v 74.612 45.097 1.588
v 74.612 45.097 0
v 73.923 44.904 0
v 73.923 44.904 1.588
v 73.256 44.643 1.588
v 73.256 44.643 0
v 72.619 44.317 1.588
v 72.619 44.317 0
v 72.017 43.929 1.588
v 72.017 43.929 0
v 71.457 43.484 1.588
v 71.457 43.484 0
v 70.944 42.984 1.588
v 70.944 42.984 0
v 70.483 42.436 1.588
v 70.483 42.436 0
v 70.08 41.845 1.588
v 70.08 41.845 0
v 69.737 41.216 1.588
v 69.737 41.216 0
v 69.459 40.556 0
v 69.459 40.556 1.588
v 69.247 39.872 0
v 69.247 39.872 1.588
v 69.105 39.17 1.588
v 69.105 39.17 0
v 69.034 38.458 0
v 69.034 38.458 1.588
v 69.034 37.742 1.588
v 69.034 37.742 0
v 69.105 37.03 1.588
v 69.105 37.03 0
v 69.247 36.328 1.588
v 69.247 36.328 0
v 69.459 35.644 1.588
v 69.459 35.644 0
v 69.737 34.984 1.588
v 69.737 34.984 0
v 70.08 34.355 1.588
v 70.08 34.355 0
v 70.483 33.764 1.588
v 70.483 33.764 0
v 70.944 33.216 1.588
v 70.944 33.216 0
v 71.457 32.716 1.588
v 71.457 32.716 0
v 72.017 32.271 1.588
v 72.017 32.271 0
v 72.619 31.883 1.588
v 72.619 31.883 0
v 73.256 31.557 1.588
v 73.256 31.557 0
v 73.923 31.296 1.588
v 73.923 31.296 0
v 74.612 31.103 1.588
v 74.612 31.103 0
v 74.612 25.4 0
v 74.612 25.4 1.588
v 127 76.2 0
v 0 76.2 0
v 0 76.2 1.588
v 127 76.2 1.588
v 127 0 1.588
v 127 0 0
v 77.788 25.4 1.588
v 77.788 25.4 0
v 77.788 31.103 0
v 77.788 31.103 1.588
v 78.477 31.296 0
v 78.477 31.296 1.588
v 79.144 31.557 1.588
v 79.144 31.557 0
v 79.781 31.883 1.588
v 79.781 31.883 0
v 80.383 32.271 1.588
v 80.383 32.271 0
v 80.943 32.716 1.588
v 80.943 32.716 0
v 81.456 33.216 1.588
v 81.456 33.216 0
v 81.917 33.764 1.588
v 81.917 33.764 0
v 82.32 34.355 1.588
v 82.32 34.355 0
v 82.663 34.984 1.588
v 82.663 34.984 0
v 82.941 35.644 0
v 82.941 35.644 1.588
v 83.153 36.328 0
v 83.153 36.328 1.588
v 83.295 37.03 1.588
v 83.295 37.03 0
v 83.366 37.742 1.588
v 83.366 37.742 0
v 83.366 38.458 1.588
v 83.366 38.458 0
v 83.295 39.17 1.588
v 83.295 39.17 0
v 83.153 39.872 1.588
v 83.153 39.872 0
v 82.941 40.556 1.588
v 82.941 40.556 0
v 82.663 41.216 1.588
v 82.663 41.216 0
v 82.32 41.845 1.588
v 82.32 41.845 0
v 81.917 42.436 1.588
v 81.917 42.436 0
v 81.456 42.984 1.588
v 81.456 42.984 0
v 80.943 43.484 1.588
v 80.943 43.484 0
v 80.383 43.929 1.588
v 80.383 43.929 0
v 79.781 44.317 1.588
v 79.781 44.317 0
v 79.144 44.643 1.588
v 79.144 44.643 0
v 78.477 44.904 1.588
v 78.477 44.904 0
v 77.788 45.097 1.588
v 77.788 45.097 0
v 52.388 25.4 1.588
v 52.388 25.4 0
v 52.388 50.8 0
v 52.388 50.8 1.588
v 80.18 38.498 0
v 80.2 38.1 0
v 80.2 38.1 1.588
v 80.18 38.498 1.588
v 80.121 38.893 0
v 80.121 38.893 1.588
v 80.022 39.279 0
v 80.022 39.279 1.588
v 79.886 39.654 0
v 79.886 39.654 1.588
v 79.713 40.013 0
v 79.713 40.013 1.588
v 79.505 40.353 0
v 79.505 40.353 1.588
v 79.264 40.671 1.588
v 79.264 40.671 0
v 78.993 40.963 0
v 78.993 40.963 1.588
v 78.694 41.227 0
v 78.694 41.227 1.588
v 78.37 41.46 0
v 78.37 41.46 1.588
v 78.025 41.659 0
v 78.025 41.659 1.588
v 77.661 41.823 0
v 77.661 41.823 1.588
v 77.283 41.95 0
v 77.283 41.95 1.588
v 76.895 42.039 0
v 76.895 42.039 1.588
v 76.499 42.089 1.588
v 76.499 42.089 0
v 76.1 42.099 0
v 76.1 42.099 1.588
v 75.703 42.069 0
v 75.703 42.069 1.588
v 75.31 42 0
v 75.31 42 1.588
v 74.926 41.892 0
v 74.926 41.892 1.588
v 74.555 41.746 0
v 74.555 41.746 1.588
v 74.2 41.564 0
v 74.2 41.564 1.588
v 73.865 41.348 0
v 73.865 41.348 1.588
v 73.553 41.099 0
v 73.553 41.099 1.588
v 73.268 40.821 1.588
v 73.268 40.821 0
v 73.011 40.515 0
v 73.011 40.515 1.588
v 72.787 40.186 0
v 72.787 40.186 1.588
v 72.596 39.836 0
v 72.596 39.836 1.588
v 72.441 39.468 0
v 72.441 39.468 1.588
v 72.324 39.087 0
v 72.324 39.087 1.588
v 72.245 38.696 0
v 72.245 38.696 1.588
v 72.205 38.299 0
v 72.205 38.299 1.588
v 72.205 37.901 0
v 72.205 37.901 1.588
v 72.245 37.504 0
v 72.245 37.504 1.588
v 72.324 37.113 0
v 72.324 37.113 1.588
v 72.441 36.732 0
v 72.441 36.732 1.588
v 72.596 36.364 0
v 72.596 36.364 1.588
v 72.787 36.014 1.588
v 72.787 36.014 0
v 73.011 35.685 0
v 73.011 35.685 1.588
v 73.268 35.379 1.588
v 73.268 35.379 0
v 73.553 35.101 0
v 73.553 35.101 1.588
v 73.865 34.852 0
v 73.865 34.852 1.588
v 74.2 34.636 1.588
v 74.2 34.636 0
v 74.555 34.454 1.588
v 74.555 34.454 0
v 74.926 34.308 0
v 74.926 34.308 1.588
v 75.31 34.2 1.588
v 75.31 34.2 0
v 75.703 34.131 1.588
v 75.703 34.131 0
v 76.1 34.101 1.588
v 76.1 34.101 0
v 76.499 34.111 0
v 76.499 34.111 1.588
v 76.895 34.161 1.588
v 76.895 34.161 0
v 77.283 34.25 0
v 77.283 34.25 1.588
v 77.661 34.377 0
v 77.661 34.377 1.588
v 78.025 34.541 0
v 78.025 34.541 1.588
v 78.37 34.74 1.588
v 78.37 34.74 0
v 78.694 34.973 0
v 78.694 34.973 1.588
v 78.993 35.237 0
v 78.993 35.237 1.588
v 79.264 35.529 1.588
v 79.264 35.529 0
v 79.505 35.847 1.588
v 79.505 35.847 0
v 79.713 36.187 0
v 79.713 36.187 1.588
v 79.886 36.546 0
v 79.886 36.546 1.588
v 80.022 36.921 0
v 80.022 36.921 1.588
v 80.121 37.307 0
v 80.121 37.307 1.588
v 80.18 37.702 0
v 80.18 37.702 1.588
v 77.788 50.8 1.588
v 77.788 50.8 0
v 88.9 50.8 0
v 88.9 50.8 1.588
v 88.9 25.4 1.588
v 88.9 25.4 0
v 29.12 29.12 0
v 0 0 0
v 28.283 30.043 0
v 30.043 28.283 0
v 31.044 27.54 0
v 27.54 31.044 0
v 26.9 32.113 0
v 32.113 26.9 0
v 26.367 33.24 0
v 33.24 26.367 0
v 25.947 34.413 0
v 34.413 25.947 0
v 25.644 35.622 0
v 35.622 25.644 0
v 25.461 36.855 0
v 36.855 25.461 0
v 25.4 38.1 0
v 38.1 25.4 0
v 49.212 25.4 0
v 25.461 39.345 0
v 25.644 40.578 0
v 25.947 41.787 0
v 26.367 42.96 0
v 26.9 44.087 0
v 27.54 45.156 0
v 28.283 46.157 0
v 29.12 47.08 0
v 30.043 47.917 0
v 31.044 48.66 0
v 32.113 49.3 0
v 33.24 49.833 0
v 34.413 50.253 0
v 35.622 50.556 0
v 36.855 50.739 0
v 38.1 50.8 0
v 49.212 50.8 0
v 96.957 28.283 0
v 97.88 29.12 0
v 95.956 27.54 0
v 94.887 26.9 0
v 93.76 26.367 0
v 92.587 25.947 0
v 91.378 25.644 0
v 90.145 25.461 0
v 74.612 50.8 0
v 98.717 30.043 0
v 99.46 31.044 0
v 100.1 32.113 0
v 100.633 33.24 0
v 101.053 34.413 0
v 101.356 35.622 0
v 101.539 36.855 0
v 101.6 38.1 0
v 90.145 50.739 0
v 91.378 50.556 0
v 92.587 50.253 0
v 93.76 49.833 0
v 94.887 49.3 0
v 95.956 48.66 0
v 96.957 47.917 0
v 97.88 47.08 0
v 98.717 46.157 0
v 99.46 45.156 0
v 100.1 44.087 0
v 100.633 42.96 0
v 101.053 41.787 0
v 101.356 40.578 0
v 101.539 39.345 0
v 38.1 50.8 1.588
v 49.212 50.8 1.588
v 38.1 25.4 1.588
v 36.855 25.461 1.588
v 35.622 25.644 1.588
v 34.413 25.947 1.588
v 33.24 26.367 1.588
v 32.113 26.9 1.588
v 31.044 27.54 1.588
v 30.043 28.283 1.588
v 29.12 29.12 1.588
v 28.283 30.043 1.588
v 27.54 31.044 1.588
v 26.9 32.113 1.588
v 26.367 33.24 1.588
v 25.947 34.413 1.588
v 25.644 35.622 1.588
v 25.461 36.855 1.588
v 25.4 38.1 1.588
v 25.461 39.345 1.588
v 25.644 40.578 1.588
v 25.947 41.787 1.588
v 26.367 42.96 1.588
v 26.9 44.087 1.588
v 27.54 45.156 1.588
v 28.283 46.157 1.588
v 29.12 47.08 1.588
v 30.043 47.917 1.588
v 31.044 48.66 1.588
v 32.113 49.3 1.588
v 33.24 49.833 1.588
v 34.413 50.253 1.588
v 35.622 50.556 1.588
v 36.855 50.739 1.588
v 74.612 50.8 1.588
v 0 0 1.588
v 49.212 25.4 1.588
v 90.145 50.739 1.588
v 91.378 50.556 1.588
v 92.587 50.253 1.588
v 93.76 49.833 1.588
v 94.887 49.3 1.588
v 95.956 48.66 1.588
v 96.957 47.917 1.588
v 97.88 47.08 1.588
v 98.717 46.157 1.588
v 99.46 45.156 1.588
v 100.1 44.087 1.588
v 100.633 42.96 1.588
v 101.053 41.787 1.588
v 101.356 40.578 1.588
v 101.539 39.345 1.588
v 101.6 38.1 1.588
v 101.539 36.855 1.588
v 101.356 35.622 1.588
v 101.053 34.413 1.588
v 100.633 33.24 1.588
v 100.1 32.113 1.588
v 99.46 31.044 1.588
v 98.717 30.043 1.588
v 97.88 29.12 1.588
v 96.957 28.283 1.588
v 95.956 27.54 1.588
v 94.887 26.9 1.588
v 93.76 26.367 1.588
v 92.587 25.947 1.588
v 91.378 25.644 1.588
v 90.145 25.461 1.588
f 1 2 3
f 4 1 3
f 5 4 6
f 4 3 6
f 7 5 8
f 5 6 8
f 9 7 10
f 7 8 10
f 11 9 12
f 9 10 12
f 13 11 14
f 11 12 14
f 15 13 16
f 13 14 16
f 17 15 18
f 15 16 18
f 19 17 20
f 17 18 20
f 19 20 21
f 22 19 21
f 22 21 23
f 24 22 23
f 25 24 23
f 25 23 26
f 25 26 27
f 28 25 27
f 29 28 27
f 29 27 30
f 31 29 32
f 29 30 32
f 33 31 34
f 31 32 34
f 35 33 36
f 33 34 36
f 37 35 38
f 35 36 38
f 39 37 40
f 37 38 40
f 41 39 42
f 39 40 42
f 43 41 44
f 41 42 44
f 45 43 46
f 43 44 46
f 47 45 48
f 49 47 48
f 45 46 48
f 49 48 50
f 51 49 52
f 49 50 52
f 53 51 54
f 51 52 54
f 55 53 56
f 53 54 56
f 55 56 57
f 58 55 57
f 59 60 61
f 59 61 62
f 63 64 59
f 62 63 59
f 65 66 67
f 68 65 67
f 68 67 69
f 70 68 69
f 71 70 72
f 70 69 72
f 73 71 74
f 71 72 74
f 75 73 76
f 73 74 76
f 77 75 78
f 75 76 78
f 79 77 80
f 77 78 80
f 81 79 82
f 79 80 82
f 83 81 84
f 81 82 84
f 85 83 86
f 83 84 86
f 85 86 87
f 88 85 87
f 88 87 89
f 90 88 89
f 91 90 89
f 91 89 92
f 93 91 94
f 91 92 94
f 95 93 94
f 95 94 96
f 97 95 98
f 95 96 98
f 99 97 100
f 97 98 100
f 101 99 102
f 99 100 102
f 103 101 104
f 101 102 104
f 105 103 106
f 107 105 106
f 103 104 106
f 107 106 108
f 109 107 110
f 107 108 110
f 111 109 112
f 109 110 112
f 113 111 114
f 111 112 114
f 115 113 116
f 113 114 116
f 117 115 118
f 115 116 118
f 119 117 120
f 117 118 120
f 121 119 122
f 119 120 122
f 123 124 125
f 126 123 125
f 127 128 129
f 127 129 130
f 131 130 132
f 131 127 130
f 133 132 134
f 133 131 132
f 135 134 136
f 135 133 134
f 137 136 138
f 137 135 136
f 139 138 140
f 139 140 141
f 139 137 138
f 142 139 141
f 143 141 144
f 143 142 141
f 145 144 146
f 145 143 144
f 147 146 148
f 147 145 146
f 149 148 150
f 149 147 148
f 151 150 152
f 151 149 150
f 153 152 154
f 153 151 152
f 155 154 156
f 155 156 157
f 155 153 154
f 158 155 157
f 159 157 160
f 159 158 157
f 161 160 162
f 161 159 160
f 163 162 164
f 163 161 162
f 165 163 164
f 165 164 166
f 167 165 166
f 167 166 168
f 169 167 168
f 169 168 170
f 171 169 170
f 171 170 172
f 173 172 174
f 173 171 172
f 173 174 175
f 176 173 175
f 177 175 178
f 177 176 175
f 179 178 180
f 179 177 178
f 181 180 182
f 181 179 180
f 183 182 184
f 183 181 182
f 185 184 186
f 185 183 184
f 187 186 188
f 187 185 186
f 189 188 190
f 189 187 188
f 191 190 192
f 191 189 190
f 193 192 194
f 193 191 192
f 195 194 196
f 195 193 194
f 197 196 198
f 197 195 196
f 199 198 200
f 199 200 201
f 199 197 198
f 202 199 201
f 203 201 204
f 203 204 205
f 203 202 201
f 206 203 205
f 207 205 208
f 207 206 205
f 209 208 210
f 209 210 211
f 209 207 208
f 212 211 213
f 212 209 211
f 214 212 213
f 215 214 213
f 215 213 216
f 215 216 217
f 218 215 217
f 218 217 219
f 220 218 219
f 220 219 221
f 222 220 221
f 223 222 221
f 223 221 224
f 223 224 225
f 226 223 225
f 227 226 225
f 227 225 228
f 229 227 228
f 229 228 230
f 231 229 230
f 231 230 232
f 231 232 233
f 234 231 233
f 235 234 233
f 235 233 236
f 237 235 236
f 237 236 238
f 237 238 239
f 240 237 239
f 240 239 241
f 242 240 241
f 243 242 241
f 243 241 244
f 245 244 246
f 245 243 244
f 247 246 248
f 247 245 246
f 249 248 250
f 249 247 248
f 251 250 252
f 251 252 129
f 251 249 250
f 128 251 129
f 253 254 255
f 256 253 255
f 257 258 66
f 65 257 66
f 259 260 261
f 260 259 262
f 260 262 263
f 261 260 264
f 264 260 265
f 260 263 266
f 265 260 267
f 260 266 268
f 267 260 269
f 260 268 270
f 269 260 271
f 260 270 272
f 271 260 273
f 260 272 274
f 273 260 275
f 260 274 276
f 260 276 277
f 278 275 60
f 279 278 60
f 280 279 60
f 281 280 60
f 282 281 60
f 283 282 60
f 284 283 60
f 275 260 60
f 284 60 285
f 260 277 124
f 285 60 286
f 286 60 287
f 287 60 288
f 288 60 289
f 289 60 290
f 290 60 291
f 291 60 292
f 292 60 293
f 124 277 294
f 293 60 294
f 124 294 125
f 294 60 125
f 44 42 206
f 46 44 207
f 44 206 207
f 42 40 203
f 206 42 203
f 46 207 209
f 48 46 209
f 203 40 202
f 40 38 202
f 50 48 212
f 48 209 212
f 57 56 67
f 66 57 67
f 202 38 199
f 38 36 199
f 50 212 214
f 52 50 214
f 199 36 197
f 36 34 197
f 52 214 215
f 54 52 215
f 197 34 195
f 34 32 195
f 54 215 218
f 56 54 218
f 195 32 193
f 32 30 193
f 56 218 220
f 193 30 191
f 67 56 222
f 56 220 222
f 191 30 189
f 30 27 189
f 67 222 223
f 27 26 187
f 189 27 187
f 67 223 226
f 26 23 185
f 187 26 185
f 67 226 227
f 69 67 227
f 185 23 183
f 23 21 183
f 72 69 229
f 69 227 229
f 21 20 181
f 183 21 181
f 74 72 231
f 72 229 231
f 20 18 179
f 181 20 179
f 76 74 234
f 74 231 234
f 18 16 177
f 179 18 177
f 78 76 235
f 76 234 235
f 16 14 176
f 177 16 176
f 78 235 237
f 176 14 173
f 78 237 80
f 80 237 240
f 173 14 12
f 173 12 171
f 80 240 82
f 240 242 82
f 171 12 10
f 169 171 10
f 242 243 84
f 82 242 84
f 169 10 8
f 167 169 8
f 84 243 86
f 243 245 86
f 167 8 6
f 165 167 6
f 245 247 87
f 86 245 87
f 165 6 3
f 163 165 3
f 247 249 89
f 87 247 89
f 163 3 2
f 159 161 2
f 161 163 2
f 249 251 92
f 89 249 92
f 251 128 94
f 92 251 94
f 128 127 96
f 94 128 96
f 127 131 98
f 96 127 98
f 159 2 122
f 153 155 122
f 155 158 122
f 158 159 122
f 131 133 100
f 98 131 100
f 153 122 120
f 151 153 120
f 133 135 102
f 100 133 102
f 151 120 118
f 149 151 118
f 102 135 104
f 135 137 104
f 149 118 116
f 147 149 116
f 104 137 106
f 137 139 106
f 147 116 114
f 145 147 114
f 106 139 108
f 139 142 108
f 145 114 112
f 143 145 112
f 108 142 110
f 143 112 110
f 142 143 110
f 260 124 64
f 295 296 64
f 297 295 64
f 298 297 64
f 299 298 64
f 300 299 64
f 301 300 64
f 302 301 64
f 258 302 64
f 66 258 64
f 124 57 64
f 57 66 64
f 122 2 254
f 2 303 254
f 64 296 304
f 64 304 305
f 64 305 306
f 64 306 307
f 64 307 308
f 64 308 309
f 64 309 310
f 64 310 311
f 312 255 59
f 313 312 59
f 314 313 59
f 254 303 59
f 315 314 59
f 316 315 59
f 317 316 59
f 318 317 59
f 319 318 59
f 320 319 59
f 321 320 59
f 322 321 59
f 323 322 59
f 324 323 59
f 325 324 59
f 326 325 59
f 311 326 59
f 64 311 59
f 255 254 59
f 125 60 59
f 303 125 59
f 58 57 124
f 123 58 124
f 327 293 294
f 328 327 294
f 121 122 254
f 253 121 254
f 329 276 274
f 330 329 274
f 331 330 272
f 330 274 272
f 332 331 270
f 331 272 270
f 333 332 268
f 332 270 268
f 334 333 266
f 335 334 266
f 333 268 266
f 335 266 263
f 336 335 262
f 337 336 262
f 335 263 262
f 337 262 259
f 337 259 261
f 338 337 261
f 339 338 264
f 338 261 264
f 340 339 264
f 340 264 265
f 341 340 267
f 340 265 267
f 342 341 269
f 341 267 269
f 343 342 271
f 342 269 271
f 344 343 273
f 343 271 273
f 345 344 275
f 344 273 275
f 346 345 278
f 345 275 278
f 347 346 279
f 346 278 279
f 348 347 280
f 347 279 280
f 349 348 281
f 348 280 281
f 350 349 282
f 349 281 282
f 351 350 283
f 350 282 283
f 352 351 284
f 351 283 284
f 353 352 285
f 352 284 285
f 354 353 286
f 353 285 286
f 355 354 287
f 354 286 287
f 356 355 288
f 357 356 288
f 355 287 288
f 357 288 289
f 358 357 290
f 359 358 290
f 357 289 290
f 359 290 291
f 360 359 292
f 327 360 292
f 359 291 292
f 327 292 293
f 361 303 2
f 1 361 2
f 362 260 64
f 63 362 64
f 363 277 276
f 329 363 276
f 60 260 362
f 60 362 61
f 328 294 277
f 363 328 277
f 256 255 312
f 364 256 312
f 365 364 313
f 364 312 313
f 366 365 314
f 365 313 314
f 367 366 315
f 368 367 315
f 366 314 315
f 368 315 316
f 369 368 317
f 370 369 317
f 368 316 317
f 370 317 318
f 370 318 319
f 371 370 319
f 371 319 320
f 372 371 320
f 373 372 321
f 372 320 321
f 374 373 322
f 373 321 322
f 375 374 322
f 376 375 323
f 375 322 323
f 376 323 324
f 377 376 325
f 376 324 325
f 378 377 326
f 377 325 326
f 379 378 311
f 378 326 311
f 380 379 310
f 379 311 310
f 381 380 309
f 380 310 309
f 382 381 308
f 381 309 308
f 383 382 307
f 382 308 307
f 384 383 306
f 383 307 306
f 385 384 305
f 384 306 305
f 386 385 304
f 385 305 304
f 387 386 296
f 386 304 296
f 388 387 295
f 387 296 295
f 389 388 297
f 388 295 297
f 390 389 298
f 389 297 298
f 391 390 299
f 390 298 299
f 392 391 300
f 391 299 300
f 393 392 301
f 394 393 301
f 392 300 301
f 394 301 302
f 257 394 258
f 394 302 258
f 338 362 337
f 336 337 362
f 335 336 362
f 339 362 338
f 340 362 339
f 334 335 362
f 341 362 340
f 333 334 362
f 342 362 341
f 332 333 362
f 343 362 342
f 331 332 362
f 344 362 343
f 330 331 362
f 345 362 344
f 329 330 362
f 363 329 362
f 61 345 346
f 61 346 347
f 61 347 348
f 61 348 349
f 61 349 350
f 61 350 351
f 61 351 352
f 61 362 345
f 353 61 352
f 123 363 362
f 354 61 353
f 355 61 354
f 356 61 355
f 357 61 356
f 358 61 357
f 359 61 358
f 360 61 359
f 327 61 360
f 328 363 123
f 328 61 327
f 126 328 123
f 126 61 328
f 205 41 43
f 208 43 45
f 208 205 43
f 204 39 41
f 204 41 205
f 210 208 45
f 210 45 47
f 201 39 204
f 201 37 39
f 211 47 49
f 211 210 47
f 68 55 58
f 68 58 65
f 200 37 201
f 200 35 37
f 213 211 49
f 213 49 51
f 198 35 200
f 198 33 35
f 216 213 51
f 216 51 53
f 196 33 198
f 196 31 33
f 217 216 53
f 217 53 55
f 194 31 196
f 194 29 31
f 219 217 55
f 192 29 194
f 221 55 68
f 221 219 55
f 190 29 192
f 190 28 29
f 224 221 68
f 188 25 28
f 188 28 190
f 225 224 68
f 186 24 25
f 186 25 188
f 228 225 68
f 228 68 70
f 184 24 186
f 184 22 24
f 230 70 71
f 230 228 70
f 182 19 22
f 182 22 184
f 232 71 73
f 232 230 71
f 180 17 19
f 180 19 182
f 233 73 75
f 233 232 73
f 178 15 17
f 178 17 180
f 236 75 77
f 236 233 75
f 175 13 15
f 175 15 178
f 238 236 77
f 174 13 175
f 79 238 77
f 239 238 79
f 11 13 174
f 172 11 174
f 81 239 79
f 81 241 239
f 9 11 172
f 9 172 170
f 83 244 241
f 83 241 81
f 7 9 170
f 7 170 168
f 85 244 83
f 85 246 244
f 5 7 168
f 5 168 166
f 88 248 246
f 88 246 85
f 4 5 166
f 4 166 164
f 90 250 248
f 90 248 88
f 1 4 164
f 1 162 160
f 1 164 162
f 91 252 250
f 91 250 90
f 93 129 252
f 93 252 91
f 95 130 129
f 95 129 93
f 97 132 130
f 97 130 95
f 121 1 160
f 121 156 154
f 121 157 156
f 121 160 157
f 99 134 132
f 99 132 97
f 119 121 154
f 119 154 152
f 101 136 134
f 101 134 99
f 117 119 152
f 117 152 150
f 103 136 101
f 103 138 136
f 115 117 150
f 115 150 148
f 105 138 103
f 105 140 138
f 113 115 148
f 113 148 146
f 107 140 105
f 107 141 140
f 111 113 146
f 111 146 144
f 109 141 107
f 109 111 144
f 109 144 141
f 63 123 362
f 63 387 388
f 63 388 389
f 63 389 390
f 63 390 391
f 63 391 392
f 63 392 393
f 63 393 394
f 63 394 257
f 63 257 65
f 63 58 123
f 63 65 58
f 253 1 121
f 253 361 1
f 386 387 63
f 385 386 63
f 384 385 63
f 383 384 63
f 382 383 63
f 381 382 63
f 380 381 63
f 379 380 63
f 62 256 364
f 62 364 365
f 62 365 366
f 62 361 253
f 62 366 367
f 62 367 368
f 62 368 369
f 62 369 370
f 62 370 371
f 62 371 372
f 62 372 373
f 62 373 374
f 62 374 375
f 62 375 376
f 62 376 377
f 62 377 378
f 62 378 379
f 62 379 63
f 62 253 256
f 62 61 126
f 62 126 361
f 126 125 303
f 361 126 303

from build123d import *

# Parameters (mm, degrees)
SKETCH1_W           = 127
SKETCH1_H           = 76.2
SKETCH1_R           = 4
BOSS_EXTRUDE1_DEPTH = 1.5875


with BuildPart() as part:
    # Sketch1 → Boss-Extrude1 (new body)
    with BuildSketch(Plane.XY):
        with Locations((63.5, 38.1)):
            Rectangle(SKETCH1_W, SKETCH1_H)
        with Locations((76.2, 38.1)):
            Circle(SKETCH1_R, mode=Mode.SUBTRACT)
        with BuildLine():
            Line((38.1, 50.8), (49.2125, 50.8))
            Line((49.2125, 50.8), (49.2125, 25.4))
            Line((49.2125, 25.4), (38.1, 25.4))
            ThreePointArc((38.1, 25.4), (25.4, 38.1), (38.1, 50.8))
        make_face(mode=Mode.SUBTRACT)
        with BuildLine():
            Line((88.9, 25.4), (77.7875, 25.4))
            Line((77.7875, 25.4), (77.7875, 31.10282423))
            ThreePointArc((77.7875, 31.10282423), (83.375, 38.1), (77.7875, 45.09717577))
            Line((77.7875, 45.09717577), (77.7875, 50.8))
            Line((77.7875, 50.8), (88.9, 50.8))
            ThreePointArc((88.9, 50.8), (101.6, 38.1), (88.9, 25.4))
        make_face(mode=Mode.SUBTRACT)
        with BuildLine():
            Line((52.3875, 50.8), (74.6125, 50.8))
            Line((74.6125, 50.8), (74.6125, 45.09717577))
            ThreePointArc((74.6125, 45.09717577), (69.025, 38.1), (74.6125, 31.10282423))
            Line((74.6125, 31.10282423), (74.6125, 25.4))
            Line((74.6125, 25.4), (52.3875, 25.4))
            Line((52.3875, 25.4), (52.3875, 50.8))
        make_face(mode=Mode.SUBTRACT)
    extrude(amount=BOSS_EXTRUDE1_DEPTH)


solid = part.part
